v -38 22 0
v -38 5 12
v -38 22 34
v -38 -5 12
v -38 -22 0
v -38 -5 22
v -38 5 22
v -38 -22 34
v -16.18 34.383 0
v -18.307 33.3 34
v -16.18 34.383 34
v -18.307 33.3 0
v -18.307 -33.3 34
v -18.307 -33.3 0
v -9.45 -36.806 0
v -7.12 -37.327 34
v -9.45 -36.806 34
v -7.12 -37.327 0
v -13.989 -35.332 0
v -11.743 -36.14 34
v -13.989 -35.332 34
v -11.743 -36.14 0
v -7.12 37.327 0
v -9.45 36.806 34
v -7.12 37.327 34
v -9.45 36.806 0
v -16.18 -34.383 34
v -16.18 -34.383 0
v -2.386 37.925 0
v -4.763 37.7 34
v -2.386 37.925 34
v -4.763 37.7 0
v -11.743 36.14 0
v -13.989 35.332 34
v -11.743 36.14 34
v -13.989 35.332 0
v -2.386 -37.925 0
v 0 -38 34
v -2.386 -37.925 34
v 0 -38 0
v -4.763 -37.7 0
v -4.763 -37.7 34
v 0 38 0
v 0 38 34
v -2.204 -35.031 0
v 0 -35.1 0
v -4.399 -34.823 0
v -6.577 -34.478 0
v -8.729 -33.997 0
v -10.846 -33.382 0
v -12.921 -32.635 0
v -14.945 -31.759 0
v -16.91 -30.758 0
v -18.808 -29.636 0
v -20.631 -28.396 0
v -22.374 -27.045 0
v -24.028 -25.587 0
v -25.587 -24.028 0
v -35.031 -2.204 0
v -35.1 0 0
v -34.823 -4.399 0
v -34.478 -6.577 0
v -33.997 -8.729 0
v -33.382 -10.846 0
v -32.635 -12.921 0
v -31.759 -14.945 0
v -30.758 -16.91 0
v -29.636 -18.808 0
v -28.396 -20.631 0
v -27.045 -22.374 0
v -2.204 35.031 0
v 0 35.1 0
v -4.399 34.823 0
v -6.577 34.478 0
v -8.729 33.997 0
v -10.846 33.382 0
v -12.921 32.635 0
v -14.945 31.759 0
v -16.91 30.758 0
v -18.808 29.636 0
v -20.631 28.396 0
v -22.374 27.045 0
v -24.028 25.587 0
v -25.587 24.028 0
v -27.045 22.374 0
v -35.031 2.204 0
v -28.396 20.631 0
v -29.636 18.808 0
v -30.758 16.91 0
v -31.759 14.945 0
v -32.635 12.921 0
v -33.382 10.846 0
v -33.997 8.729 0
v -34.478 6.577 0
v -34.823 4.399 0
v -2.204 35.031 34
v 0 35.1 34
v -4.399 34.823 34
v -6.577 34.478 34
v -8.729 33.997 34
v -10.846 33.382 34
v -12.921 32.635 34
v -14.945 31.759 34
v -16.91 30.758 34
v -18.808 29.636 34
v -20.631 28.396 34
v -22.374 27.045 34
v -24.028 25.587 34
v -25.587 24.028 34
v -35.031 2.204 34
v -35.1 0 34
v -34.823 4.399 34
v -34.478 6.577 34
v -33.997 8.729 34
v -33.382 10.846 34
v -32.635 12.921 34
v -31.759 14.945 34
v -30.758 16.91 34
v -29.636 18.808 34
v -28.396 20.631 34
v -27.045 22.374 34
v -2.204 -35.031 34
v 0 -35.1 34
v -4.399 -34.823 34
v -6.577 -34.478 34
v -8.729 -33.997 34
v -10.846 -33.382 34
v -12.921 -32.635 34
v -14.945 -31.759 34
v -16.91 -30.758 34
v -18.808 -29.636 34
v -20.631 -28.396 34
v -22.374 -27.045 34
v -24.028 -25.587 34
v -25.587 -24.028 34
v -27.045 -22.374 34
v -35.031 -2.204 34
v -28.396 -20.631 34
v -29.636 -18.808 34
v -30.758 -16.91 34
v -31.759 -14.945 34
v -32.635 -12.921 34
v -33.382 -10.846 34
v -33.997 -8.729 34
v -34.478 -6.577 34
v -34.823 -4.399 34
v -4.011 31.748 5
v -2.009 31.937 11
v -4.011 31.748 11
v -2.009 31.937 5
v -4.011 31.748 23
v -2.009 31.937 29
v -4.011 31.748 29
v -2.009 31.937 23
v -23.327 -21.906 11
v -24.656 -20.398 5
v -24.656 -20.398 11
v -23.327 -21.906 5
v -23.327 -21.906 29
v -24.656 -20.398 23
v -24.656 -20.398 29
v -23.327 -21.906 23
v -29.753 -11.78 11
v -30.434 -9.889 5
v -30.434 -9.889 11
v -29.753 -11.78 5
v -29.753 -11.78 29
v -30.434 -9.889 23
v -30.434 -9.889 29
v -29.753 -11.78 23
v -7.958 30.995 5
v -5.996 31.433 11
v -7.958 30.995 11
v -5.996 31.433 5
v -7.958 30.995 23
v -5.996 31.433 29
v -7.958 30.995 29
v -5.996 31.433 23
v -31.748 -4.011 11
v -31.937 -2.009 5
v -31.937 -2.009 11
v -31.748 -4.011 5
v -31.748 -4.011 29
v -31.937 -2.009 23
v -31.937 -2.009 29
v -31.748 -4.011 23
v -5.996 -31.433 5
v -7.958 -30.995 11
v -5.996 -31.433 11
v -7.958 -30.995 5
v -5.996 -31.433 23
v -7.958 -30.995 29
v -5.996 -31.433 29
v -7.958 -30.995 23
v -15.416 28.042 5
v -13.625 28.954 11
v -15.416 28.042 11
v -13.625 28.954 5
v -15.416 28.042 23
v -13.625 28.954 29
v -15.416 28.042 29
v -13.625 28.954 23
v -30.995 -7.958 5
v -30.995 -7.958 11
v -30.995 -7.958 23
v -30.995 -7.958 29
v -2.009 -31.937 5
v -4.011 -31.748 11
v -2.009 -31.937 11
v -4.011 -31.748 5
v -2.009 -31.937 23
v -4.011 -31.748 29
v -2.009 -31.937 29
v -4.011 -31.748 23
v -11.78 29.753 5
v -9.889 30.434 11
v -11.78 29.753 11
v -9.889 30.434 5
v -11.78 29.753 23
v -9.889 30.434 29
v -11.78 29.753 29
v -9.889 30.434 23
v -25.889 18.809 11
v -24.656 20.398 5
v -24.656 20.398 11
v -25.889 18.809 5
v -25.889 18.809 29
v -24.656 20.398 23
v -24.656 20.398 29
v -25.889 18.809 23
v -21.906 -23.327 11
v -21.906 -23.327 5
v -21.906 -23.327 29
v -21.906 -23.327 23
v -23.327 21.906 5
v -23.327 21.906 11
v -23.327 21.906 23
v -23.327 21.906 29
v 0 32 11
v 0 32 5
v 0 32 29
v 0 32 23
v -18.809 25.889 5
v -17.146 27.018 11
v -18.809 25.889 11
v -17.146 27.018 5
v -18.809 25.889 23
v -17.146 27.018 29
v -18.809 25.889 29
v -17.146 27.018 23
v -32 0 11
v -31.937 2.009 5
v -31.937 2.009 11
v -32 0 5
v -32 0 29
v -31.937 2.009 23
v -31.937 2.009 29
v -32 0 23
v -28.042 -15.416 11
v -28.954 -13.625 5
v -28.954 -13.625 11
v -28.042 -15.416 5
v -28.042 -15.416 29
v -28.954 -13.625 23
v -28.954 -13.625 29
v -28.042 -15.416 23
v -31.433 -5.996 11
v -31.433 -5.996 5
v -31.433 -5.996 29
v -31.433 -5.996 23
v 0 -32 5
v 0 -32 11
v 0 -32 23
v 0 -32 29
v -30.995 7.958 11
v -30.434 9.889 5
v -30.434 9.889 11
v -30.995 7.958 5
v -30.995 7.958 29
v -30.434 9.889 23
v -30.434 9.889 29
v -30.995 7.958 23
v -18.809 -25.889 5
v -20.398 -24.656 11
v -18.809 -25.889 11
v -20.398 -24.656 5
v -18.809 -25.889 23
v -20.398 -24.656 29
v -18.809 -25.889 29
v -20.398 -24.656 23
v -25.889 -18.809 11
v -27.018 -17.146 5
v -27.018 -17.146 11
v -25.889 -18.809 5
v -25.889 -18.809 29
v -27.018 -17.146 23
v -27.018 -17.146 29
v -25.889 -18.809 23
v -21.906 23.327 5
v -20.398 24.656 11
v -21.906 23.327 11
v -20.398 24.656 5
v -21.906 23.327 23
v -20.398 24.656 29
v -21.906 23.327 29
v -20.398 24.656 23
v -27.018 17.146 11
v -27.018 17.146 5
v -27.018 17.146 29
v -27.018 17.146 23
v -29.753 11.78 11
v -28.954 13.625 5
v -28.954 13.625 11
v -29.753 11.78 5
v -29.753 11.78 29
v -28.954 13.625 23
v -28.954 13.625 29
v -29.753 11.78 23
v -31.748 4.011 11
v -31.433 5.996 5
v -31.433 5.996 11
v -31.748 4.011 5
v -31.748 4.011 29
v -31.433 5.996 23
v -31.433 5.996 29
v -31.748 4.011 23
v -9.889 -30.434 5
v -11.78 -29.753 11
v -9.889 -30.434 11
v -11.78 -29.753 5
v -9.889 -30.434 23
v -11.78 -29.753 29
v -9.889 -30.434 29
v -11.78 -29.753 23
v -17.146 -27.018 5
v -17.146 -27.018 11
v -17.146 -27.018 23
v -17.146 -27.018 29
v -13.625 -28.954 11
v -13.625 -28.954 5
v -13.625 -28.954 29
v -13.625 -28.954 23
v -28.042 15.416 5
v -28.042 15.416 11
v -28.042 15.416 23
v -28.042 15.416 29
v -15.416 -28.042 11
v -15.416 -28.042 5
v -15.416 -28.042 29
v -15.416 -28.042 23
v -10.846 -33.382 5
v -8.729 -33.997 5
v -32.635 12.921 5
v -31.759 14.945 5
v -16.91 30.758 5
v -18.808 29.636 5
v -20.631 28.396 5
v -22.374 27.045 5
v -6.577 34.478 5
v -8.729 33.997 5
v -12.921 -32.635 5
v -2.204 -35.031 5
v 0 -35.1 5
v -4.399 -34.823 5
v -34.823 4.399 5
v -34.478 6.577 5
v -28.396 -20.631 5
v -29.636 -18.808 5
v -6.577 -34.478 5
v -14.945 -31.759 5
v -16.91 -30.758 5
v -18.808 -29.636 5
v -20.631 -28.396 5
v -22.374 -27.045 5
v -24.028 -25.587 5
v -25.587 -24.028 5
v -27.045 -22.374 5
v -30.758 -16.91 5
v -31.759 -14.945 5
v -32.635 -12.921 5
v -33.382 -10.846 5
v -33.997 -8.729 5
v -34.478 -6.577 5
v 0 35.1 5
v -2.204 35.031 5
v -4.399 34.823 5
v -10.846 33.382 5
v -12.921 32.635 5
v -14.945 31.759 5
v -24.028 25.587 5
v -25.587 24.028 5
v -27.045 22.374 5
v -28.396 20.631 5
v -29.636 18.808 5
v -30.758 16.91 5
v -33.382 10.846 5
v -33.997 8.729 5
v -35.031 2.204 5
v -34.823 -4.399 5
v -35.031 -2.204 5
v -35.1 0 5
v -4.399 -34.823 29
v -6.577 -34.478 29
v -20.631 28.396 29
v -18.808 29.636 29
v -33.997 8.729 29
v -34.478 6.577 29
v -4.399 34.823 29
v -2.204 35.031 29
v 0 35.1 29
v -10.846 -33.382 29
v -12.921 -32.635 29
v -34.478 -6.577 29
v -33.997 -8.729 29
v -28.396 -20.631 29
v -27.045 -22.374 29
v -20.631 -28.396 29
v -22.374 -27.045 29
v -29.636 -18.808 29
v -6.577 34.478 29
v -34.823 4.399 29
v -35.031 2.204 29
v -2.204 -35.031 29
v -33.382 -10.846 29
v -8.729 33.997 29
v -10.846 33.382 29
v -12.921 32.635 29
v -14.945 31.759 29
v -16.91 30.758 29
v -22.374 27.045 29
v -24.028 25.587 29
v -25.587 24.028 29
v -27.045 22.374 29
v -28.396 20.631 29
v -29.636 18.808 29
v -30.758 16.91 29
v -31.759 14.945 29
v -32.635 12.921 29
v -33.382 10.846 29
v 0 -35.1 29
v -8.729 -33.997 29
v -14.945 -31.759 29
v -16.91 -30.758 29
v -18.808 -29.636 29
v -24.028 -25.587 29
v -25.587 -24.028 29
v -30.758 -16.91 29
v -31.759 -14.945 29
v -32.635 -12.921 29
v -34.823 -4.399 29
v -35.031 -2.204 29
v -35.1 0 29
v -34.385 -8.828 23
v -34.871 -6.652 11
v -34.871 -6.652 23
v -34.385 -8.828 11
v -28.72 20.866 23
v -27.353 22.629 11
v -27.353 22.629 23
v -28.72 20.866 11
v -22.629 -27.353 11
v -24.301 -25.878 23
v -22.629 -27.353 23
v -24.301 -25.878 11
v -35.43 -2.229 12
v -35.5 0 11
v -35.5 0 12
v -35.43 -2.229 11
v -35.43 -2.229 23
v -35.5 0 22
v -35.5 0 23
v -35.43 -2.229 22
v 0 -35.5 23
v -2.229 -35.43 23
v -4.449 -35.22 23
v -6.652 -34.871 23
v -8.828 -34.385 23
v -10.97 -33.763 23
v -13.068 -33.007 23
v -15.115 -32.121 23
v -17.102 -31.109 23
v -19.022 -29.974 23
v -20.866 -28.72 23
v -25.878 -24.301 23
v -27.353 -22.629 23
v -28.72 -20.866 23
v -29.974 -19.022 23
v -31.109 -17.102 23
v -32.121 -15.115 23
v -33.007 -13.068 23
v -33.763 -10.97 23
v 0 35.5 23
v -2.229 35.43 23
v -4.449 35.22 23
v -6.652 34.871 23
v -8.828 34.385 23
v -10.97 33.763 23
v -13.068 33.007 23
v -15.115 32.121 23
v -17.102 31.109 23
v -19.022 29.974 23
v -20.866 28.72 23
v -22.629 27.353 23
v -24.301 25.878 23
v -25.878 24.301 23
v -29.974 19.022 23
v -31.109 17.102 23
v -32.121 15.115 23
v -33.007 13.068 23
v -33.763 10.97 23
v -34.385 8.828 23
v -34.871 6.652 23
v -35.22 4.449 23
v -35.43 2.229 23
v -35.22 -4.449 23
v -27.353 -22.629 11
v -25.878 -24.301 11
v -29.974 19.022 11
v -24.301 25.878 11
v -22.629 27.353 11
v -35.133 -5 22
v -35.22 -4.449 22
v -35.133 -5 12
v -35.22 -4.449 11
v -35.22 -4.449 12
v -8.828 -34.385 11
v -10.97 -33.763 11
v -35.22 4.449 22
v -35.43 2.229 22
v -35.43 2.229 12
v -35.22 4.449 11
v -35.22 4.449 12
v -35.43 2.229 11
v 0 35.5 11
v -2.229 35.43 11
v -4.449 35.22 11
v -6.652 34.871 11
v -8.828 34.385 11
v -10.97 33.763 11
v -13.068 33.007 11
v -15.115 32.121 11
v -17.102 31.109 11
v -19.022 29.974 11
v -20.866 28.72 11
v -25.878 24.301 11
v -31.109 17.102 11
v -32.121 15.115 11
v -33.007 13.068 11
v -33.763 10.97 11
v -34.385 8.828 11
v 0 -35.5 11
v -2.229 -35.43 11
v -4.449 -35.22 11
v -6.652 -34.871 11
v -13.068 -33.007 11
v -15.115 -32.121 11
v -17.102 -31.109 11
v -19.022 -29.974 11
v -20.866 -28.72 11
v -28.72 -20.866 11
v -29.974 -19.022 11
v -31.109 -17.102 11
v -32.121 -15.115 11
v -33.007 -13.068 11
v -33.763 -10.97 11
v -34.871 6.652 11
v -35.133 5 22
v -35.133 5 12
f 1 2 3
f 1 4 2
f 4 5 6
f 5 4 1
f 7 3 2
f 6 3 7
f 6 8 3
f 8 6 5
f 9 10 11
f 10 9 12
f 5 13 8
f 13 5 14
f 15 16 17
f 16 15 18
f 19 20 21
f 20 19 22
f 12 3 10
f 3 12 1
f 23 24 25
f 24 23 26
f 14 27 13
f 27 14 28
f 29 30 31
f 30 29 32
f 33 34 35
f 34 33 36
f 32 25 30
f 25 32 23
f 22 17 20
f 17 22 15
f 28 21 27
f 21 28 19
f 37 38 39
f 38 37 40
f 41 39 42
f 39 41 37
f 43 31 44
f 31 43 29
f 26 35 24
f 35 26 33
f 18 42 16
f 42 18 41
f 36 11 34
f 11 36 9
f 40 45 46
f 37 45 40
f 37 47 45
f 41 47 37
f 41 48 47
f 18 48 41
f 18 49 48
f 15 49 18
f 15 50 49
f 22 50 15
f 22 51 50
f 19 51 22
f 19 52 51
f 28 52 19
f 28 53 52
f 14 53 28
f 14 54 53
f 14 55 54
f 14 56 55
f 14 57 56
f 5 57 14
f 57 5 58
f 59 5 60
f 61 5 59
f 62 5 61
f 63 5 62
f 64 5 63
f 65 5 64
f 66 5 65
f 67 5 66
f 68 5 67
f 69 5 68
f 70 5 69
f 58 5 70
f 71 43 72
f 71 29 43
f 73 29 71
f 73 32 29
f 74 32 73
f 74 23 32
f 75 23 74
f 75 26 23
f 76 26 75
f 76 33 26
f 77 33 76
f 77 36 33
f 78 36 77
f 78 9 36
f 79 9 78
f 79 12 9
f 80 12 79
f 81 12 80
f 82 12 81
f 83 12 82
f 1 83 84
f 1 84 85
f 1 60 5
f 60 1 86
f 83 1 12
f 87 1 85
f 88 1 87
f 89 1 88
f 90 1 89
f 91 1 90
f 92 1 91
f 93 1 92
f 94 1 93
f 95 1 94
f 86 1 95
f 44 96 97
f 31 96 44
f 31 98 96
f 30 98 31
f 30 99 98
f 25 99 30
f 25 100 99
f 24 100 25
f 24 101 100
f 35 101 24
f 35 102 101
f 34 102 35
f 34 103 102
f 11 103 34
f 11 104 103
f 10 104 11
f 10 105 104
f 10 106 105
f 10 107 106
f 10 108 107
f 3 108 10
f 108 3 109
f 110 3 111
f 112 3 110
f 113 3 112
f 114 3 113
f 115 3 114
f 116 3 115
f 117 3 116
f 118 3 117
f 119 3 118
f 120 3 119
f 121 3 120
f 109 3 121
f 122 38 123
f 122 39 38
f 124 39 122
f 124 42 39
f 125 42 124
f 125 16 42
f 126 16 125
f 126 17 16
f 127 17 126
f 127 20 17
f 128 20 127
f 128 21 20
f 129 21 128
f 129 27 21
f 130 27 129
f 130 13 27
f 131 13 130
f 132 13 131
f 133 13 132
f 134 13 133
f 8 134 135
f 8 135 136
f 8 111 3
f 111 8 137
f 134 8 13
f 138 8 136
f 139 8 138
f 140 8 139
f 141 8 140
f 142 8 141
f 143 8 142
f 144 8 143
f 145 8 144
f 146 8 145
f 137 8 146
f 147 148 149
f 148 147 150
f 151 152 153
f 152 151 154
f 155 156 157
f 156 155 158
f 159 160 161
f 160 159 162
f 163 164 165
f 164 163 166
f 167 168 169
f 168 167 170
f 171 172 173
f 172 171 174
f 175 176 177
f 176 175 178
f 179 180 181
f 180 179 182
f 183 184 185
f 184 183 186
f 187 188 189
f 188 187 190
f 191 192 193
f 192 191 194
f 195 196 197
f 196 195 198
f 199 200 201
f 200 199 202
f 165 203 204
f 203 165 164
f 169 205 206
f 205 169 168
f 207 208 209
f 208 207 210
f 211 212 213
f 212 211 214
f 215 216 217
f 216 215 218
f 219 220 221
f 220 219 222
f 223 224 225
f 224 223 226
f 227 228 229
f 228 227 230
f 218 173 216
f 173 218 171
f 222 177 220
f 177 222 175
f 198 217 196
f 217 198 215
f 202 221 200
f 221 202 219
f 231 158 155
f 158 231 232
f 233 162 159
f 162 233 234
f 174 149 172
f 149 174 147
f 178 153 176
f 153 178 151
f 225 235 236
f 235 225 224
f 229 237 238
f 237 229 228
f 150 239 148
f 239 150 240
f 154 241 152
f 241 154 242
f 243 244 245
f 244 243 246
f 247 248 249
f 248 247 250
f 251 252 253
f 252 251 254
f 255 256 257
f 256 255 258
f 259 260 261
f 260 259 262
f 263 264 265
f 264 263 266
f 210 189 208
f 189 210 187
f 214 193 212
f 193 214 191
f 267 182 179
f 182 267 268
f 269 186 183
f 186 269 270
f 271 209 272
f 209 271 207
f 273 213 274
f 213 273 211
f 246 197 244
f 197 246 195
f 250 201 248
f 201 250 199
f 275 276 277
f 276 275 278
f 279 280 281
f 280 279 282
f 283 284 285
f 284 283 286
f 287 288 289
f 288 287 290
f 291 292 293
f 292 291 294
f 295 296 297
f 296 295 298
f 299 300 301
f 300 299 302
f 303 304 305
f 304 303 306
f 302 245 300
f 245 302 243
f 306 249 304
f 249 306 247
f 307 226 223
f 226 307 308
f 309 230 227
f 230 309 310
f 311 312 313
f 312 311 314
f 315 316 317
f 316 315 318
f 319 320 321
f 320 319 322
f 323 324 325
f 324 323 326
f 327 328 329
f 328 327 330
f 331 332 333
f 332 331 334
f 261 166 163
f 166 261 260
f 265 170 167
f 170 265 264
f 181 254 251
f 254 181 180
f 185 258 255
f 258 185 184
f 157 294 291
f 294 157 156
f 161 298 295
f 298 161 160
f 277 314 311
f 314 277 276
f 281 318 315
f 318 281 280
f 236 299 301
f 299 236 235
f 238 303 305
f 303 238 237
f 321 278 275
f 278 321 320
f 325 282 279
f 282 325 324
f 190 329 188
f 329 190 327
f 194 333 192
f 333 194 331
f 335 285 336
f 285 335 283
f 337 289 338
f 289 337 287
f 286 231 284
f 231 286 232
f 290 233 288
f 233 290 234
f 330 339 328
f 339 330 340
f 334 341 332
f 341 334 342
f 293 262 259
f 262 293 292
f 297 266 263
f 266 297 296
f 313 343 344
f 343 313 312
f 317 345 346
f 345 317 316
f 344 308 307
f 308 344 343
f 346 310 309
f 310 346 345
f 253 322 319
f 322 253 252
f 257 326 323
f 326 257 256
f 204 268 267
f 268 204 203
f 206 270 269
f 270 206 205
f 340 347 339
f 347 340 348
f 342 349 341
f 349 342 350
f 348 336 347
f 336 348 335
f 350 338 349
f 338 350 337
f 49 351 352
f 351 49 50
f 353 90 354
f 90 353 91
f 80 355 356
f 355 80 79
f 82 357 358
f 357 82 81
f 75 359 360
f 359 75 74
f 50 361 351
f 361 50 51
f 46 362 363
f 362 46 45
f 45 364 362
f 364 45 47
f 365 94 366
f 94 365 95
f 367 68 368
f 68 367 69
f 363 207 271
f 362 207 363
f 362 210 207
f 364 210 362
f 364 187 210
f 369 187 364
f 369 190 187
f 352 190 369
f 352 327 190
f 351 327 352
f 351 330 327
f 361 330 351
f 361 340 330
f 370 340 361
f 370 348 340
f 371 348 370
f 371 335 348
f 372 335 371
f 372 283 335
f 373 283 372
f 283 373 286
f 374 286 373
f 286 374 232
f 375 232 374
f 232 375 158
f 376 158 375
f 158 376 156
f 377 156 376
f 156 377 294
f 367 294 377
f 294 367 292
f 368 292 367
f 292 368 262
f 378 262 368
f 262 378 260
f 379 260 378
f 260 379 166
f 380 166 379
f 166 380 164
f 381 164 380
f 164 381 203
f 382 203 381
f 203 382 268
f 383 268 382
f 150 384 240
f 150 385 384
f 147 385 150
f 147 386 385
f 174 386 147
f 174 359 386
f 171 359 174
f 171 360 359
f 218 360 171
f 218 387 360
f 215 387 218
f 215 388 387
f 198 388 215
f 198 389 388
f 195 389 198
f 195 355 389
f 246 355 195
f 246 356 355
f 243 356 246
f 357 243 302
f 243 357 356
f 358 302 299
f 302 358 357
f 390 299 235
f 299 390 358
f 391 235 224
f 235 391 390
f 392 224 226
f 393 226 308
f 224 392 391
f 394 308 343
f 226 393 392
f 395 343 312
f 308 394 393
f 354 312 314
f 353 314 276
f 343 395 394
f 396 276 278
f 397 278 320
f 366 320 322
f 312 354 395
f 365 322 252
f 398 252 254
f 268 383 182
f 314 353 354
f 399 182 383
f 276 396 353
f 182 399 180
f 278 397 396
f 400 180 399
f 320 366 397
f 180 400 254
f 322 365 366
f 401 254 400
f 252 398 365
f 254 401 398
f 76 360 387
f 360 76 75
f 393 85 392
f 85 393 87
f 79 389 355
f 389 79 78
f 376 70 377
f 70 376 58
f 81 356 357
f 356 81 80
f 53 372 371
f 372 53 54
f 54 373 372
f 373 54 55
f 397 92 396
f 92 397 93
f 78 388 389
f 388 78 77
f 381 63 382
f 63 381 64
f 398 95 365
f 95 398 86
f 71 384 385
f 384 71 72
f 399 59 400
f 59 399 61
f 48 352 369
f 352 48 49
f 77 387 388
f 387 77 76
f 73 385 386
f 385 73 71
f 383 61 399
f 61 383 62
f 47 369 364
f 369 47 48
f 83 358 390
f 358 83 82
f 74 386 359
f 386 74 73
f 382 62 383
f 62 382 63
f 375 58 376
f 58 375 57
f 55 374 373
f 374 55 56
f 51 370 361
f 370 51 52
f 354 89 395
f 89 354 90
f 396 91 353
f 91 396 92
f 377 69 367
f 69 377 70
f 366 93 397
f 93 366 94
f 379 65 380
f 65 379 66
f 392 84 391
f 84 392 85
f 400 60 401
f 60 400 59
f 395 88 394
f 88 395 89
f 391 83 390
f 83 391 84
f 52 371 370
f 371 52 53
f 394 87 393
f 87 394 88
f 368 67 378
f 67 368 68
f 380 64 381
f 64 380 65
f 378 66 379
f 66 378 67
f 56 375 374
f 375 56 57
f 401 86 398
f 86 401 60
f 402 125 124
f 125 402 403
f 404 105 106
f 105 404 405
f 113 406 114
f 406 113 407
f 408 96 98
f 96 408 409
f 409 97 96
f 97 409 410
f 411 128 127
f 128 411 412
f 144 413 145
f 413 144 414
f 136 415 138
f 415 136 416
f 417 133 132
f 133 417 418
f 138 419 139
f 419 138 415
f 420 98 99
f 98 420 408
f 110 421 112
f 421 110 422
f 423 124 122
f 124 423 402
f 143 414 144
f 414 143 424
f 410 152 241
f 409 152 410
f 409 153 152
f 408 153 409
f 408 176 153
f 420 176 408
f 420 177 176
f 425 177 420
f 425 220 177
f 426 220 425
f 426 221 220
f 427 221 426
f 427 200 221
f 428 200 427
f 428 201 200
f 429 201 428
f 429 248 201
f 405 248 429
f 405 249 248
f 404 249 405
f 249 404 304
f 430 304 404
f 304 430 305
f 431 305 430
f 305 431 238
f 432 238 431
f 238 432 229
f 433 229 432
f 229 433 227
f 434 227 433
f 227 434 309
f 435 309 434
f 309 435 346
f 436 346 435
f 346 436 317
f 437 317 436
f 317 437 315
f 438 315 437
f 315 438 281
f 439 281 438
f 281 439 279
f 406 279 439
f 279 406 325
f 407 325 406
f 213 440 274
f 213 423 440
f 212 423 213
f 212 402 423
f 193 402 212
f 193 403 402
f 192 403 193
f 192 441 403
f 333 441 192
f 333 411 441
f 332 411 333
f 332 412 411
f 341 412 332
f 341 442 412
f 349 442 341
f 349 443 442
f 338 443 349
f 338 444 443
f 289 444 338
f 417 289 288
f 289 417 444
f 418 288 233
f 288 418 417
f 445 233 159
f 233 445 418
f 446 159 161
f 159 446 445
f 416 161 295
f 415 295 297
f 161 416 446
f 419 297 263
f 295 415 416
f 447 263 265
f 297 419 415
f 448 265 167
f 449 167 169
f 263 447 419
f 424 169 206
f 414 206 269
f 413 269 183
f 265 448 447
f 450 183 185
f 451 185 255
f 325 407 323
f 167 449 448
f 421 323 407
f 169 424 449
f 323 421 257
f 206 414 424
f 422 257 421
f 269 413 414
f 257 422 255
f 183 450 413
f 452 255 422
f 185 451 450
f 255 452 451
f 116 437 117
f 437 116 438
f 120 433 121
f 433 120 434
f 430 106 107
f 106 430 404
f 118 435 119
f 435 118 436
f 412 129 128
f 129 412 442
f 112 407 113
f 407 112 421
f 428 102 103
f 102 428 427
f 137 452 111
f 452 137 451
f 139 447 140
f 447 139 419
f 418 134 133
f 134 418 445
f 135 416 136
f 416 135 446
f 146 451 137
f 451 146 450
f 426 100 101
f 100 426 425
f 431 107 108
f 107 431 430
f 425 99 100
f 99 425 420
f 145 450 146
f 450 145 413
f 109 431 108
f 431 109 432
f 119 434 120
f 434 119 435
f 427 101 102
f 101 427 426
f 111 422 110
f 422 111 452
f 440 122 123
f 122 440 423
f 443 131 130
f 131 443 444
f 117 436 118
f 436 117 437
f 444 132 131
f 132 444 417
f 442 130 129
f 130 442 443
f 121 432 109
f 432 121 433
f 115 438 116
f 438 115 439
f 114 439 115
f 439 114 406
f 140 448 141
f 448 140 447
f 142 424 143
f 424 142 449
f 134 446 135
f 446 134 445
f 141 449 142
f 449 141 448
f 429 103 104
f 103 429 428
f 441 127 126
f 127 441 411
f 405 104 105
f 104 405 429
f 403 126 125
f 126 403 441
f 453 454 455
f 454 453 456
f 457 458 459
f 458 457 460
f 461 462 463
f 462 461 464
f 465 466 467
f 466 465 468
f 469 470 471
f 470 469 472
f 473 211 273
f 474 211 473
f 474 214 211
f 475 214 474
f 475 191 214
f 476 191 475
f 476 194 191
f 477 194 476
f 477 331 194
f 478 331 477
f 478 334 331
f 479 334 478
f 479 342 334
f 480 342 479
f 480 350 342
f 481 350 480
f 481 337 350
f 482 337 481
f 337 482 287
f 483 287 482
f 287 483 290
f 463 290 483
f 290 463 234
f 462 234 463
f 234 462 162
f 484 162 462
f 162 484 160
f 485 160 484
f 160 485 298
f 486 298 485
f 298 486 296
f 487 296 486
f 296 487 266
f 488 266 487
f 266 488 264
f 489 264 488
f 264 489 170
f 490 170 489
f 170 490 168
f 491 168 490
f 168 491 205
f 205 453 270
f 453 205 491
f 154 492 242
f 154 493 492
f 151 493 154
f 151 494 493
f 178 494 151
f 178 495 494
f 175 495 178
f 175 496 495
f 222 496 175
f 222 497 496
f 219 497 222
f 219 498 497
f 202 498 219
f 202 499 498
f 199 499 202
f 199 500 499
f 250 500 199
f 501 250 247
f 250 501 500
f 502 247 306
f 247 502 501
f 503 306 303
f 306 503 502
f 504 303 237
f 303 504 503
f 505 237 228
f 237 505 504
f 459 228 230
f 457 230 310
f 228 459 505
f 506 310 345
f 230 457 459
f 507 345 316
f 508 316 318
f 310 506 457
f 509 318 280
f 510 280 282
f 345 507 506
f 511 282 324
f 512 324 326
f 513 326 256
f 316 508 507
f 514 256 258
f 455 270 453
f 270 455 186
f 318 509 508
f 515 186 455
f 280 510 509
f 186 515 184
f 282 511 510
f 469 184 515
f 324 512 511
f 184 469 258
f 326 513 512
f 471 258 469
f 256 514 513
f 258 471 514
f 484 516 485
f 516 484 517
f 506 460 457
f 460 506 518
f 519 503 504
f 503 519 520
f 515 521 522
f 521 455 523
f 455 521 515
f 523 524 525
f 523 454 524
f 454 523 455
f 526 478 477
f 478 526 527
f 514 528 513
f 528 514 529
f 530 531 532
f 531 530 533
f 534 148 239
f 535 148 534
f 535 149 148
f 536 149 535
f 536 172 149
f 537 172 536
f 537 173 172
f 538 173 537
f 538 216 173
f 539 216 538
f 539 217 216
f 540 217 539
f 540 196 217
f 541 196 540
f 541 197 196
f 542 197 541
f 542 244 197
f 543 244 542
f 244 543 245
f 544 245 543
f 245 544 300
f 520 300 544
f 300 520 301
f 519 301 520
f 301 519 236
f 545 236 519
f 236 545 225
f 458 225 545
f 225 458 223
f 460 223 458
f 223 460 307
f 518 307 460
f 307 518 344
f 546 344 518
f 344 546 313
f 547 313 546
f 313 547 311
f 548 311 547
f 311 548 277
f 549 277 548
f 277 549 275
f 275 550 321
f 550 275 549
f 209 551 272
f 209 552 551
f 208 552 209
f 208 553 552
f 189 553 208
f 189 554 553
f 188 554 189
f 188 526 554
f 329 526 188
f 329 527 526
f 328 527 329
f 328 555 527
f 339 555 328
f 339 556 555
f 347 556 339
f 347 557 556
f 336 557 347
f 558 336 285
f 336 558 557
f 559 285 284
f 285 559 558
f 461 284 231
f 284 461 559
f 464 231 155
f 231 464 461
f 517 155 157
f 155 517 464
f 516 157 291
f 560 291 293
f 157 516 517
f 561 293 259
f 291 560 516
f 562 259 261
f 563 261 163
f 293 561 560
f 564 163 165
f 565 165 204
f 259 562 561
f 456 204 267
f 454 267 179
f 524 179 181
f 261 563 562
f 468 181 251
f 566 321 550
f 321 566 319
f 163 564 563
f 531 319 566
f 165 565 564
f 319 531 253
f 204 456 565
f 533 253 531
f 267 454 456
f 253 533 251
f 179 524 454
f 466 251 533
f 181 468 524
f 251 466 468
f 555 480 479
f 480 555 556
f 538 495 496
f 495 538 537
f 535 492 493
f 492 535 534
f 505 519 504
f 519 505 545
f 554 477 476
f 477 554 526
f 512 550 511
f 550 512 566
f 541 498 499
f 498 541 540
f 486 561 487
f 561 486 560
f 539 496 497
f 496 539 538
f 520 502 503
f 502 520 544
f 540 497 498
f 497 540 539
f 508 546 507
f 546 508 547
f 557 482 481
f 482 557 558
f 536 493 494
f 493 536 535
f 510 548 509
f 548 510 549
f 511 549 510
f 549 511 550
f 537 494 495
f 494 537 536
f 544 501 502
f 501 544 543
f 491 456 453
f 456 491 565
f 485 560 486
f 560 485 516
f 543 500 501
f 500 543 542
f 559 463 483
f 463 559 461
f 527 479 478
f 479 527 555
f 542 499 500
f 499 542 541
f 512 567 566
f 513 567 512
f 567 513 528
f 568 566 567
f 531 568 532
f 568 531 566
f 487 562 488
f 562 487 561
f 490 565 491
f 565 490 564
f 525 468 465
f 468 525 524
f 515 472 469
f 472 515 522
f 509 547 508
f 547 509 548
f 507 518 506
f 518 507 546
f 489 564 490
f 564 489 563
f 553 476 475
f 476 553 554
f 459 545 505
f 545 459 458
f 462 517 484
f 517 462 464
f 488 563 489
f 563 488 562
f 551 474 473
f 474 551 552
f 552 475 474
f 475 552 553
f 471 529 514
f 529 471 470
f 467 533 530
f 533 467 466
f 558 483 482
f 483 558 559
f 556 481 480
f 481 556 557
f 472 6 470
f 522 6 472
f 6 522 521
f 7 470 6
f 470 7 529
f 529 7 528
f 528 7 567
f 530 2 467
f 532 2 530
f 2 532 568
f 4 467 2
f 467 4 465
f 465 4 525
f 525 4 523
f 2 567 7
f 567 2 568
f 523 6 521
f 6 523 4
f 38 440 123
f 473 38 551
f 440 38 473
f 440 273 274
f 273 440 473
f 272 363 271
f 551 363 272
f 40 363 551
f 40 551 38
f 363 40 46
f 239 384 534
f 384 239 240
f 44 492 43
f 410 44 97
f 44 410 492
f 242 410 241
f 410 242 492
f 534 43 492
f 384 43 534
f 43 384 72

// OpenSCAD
FAN_RADIUS=30;
FAN_INNER_RADIUS=12;

BEARING_OUTER_DIA=12.7; // 1/2 inch
BEARING_INNER_DIA=6.36;  // 1/4 inch
BEARING_WIDTH=4.76;

NOSE_LENGTH=17;

MOTOR_GEAR_DIA=7;
NUM_TEETH=12;
MOTOR_GEAR_WIDTH=5.5;

// Single fan blade
module fan_blade(angle, width)
{  
  linear_extrude(height=FAN_RADIUS+5, twist=angle,slices=30)
    square([width+10,1.5]); 
}

module driveShaft(dsRad, offset=19, spacerLen=2)
{
  // shaft for bearing / next fan
  translate([offset,0,0,])
    rotate(a=90,v=[0,1,0])
      cylinder(h=15,r=dsRad);

  // offset bearing
  translate([offset,0,0,])
    rotate(a=90,v=[0,1,0])
    cylinder(h=spacerLen,r=dsRad+.5);
}

module fan(blade_angle, spacing, width)
{
  
    
  rotate(a=90,v=[0,1,0])
    cylinder(h=20,r=FAN_INNER_RADIUS);

  driveShaft(3.18);

  intersection()
  {
    rotate(a=90,v=[0,1,0])
    cylinder(h=width, r=FAN_RADIUS);
  

    for(i = [spacing:spacing:360])
    {
      translate([-4,0,0])
      rotate(a=i, v=[1,0,0])  
        fan_blade(blade_angle, 15+8);
    }
  
  }

}

// I created two slightly different fan blades.  The one I determine that
// moves the most air will go behind the other fan
module fanDrive1()
{
  difference()
  {
    fan(50, 20, 15);
 
    translate([-20,0,0])
      driveShaft(3.25);
  }

}

module fanDrive2()
{
  difference()
  {
    fan(60,15, 15);
 
    translate([-20,0,0])
      driveShaft(3.25);
  }

}

module nose_cone()
{
  INCREMENT=.5;
  translate([0,0,NOSE_LENGTH])
  rotate(180,[1,0,0])
  hull()
  {
    for(i = [0: INCREMENT: NOSE_LENGTH - INCREMENT ])
    {
      //echo(i);
      firstRad = 3 * pow(i, .5);
      secondRad  = 3 * pow(i+INCREMENT, .5);

      translate([0,0,i])
      cylinder(h = INCREMENT, r1 = firstRad, r2 = secondRad, center = false);
    }
  }
}


module fanNose()
{
  difference()
  {

  nose_cone();
  
  translate([0,0,-1])
    cylinder(h=7, r=BEARING_INNER_DIA/2 + .1);
  }
  
}

module bearing_outer_holder()
{
  difference()
  {
    union()
    {
    translate([-2.5,0,0])
      cube([5,BEARING_OUTER_DIA/2+15,BEARING_WIDTH]);
    
      translate([0,0,-1])
    cylinder(h=BEARING_WIDTH+1.5, r=BEARING_OUTER_DIA/2+5);
    }
    
    cylinder(h=BEARING_WIDTH+1.5, r=BEARING_OUTER_DIA/2+.1);
    
    translate([0,0,-2])
    cylinder(h=5, r=BEARING_OUTER_DIA/2-1.3);
  }
}

module driveShaftSpacer(width)
{
  difference()
  {
  cylinder(h=width, r=BEARING_INNER_DIA/2+1.5);
    
  translate([0,0,-1])
  cylinder(h=width+2, r=BEARING_INNER_DIA/2+.3);
  }
  
}

// My intent is to use the same shroud on the front and rear of the engine.  I will
// measure and fit a center section to join the two shrouds in the middle
module turbine_shroud_end()
{
  // Set the bearing inside the shroud a little bit
  translate([0,0,10])
    bearing_outer_holder();
  
  translate([-2.5,8,10])
      cube([5,25,BEARING_WIDTH]);
  
  difference()
  {
    cylinder(h=25, r=FAN_RADIUS+5);
    
    translate([0,0,-1])
    cylinder(h=27, r=FAN_RADIUS+2);
  }
  
  // Rounded front edge
  rotate(90,[0,0,1])
  rotate_extrude(convexity=10)  
  translate([FAN_RADIUS+3.5,0,0])  
  circle(r=1.5);
}

module motor_gear()
{
  TEETH_ANGLE=360/NUM_TEETH;
  TOOTH_SIZE = 1.5;
  for(i = [0:TEETH_ANGLE:360-TEETH_ANGLE])
  {
    rotate(i,[0,0,1])
    translate([MOTOR_GEAR_DIA/2+.5,0,0])
    rotate(45, [0,0,1])
    translate([-TOOTH_SIZE/2,-TOOTH_SIZE/2,0])
    cube([TOOTH_SIZE,TOOTH_SIZE,MOTOR_GEAR_WIDTH]);
  }
  
  difference()
  {
    cylinder(h=MOTOR_GEAR_WIDTH,r=MOTOR_GEAR_DIA/2+3);
    
    translate([0,0,-1])
    cylinder(h=MOTOR_GEAR_WIDTH+2,r=MOTOR_GEAR_DIA/2+.5);
    
  }
  
} 

module gear_shaft()
{
  motor_gear();
  translate([0,0,MOTOR_GEAR_WIDTH-.1])
  cylinder(h=2.1, r=MOTOR_GEAR_DIA/2+3);
  
  //translate([0,0,MOTOR_GEAR_WIDTH-.1])
  rotate(90,[0,-1,0])
  driveShaft(3.18, MOTOR_GEAR_WIDTH + 2, 3);
}

module shroudCoupler()
{
  JOINT_LEN = 5;
  COUPLER_LEN = 24;
  
  wholeLen = COUPLER_LEN + 2 * JOINT_LEN;
  
  difference()
  {
    hull()
    {
      cylinder(h=wholeLen, r=FAN_RADIUS+8);
      
      translate([-FAN_RADIUS-8,-22,0])
      cube([10,44,wholeLen]);
      
      translate([FAN_RADIUS+5,-11,0])
      cube([3,22,wholeLen]);
    }
    // Main fan area
    translate([0,0,-1])
    cylinder(h=wholeLen+2, r=FAN_RADIUS+2);
    
    // Joint area
    translate([0,0,-1])
    cylinder(h=JOINT_LEN+1, r=FAN_RADIUS+5.1);
    
    // Joint area
    translate([0,0,COUPLER_LEN+JOINT_LEN])
    cylinder(h=JOINT_LEN+1, r=FAN_RADIUS+5.1);
    
    // LED strip area
    LED_WIDTH=10;
    LED_KEEPOUT_WIDTH=LED_WIDTH+2;
    
    translate([0,0,JOINT_LEN + (COUPLER_LEN - LED_KEEPOUT_WIDTH)/2])
    cylinder(h=LED_KEEPOUT_WIDTH, r=FAN_RADIUS+5.5);
    
    // Wiring hole
    translate([-FAN_RADIUS-10,-5,wholeLen/2-5])
    cube([30,10,10]);
    
  }
}

module shroudCouplerBottom()
{
  difference()
  {
    shroudCoupler();
  
    translate([0,-2*FAN_RADIUS, -2 * FAN_RADIUS])
    cube([FAN_RADIUS*2, FAN_RADIUS*6, FAN_RADIUS*6]);
  }
}

module shroudCouplerTop()
{
  difference()
  {
    shroudCoupler();
    
    rotate(180,[0,-1,0])
    translate([0,-2*FAN_RADIUS, -2 * FAN_RADIUS])
    cube([FAN_RADIUS*2, FAN_RADIUS*6, FAN_RADIUS*6]);
  }
}
// Uncomment 1 at a time to print

// fanNose();
// fanDrive1();
// fanDrive2();
// driveShaftSpacer(3);
// turbine_shroud_end();
// gear_shaft();
shroudCouplerBottom();
// shroudCouplerTop();

$fn=100;
